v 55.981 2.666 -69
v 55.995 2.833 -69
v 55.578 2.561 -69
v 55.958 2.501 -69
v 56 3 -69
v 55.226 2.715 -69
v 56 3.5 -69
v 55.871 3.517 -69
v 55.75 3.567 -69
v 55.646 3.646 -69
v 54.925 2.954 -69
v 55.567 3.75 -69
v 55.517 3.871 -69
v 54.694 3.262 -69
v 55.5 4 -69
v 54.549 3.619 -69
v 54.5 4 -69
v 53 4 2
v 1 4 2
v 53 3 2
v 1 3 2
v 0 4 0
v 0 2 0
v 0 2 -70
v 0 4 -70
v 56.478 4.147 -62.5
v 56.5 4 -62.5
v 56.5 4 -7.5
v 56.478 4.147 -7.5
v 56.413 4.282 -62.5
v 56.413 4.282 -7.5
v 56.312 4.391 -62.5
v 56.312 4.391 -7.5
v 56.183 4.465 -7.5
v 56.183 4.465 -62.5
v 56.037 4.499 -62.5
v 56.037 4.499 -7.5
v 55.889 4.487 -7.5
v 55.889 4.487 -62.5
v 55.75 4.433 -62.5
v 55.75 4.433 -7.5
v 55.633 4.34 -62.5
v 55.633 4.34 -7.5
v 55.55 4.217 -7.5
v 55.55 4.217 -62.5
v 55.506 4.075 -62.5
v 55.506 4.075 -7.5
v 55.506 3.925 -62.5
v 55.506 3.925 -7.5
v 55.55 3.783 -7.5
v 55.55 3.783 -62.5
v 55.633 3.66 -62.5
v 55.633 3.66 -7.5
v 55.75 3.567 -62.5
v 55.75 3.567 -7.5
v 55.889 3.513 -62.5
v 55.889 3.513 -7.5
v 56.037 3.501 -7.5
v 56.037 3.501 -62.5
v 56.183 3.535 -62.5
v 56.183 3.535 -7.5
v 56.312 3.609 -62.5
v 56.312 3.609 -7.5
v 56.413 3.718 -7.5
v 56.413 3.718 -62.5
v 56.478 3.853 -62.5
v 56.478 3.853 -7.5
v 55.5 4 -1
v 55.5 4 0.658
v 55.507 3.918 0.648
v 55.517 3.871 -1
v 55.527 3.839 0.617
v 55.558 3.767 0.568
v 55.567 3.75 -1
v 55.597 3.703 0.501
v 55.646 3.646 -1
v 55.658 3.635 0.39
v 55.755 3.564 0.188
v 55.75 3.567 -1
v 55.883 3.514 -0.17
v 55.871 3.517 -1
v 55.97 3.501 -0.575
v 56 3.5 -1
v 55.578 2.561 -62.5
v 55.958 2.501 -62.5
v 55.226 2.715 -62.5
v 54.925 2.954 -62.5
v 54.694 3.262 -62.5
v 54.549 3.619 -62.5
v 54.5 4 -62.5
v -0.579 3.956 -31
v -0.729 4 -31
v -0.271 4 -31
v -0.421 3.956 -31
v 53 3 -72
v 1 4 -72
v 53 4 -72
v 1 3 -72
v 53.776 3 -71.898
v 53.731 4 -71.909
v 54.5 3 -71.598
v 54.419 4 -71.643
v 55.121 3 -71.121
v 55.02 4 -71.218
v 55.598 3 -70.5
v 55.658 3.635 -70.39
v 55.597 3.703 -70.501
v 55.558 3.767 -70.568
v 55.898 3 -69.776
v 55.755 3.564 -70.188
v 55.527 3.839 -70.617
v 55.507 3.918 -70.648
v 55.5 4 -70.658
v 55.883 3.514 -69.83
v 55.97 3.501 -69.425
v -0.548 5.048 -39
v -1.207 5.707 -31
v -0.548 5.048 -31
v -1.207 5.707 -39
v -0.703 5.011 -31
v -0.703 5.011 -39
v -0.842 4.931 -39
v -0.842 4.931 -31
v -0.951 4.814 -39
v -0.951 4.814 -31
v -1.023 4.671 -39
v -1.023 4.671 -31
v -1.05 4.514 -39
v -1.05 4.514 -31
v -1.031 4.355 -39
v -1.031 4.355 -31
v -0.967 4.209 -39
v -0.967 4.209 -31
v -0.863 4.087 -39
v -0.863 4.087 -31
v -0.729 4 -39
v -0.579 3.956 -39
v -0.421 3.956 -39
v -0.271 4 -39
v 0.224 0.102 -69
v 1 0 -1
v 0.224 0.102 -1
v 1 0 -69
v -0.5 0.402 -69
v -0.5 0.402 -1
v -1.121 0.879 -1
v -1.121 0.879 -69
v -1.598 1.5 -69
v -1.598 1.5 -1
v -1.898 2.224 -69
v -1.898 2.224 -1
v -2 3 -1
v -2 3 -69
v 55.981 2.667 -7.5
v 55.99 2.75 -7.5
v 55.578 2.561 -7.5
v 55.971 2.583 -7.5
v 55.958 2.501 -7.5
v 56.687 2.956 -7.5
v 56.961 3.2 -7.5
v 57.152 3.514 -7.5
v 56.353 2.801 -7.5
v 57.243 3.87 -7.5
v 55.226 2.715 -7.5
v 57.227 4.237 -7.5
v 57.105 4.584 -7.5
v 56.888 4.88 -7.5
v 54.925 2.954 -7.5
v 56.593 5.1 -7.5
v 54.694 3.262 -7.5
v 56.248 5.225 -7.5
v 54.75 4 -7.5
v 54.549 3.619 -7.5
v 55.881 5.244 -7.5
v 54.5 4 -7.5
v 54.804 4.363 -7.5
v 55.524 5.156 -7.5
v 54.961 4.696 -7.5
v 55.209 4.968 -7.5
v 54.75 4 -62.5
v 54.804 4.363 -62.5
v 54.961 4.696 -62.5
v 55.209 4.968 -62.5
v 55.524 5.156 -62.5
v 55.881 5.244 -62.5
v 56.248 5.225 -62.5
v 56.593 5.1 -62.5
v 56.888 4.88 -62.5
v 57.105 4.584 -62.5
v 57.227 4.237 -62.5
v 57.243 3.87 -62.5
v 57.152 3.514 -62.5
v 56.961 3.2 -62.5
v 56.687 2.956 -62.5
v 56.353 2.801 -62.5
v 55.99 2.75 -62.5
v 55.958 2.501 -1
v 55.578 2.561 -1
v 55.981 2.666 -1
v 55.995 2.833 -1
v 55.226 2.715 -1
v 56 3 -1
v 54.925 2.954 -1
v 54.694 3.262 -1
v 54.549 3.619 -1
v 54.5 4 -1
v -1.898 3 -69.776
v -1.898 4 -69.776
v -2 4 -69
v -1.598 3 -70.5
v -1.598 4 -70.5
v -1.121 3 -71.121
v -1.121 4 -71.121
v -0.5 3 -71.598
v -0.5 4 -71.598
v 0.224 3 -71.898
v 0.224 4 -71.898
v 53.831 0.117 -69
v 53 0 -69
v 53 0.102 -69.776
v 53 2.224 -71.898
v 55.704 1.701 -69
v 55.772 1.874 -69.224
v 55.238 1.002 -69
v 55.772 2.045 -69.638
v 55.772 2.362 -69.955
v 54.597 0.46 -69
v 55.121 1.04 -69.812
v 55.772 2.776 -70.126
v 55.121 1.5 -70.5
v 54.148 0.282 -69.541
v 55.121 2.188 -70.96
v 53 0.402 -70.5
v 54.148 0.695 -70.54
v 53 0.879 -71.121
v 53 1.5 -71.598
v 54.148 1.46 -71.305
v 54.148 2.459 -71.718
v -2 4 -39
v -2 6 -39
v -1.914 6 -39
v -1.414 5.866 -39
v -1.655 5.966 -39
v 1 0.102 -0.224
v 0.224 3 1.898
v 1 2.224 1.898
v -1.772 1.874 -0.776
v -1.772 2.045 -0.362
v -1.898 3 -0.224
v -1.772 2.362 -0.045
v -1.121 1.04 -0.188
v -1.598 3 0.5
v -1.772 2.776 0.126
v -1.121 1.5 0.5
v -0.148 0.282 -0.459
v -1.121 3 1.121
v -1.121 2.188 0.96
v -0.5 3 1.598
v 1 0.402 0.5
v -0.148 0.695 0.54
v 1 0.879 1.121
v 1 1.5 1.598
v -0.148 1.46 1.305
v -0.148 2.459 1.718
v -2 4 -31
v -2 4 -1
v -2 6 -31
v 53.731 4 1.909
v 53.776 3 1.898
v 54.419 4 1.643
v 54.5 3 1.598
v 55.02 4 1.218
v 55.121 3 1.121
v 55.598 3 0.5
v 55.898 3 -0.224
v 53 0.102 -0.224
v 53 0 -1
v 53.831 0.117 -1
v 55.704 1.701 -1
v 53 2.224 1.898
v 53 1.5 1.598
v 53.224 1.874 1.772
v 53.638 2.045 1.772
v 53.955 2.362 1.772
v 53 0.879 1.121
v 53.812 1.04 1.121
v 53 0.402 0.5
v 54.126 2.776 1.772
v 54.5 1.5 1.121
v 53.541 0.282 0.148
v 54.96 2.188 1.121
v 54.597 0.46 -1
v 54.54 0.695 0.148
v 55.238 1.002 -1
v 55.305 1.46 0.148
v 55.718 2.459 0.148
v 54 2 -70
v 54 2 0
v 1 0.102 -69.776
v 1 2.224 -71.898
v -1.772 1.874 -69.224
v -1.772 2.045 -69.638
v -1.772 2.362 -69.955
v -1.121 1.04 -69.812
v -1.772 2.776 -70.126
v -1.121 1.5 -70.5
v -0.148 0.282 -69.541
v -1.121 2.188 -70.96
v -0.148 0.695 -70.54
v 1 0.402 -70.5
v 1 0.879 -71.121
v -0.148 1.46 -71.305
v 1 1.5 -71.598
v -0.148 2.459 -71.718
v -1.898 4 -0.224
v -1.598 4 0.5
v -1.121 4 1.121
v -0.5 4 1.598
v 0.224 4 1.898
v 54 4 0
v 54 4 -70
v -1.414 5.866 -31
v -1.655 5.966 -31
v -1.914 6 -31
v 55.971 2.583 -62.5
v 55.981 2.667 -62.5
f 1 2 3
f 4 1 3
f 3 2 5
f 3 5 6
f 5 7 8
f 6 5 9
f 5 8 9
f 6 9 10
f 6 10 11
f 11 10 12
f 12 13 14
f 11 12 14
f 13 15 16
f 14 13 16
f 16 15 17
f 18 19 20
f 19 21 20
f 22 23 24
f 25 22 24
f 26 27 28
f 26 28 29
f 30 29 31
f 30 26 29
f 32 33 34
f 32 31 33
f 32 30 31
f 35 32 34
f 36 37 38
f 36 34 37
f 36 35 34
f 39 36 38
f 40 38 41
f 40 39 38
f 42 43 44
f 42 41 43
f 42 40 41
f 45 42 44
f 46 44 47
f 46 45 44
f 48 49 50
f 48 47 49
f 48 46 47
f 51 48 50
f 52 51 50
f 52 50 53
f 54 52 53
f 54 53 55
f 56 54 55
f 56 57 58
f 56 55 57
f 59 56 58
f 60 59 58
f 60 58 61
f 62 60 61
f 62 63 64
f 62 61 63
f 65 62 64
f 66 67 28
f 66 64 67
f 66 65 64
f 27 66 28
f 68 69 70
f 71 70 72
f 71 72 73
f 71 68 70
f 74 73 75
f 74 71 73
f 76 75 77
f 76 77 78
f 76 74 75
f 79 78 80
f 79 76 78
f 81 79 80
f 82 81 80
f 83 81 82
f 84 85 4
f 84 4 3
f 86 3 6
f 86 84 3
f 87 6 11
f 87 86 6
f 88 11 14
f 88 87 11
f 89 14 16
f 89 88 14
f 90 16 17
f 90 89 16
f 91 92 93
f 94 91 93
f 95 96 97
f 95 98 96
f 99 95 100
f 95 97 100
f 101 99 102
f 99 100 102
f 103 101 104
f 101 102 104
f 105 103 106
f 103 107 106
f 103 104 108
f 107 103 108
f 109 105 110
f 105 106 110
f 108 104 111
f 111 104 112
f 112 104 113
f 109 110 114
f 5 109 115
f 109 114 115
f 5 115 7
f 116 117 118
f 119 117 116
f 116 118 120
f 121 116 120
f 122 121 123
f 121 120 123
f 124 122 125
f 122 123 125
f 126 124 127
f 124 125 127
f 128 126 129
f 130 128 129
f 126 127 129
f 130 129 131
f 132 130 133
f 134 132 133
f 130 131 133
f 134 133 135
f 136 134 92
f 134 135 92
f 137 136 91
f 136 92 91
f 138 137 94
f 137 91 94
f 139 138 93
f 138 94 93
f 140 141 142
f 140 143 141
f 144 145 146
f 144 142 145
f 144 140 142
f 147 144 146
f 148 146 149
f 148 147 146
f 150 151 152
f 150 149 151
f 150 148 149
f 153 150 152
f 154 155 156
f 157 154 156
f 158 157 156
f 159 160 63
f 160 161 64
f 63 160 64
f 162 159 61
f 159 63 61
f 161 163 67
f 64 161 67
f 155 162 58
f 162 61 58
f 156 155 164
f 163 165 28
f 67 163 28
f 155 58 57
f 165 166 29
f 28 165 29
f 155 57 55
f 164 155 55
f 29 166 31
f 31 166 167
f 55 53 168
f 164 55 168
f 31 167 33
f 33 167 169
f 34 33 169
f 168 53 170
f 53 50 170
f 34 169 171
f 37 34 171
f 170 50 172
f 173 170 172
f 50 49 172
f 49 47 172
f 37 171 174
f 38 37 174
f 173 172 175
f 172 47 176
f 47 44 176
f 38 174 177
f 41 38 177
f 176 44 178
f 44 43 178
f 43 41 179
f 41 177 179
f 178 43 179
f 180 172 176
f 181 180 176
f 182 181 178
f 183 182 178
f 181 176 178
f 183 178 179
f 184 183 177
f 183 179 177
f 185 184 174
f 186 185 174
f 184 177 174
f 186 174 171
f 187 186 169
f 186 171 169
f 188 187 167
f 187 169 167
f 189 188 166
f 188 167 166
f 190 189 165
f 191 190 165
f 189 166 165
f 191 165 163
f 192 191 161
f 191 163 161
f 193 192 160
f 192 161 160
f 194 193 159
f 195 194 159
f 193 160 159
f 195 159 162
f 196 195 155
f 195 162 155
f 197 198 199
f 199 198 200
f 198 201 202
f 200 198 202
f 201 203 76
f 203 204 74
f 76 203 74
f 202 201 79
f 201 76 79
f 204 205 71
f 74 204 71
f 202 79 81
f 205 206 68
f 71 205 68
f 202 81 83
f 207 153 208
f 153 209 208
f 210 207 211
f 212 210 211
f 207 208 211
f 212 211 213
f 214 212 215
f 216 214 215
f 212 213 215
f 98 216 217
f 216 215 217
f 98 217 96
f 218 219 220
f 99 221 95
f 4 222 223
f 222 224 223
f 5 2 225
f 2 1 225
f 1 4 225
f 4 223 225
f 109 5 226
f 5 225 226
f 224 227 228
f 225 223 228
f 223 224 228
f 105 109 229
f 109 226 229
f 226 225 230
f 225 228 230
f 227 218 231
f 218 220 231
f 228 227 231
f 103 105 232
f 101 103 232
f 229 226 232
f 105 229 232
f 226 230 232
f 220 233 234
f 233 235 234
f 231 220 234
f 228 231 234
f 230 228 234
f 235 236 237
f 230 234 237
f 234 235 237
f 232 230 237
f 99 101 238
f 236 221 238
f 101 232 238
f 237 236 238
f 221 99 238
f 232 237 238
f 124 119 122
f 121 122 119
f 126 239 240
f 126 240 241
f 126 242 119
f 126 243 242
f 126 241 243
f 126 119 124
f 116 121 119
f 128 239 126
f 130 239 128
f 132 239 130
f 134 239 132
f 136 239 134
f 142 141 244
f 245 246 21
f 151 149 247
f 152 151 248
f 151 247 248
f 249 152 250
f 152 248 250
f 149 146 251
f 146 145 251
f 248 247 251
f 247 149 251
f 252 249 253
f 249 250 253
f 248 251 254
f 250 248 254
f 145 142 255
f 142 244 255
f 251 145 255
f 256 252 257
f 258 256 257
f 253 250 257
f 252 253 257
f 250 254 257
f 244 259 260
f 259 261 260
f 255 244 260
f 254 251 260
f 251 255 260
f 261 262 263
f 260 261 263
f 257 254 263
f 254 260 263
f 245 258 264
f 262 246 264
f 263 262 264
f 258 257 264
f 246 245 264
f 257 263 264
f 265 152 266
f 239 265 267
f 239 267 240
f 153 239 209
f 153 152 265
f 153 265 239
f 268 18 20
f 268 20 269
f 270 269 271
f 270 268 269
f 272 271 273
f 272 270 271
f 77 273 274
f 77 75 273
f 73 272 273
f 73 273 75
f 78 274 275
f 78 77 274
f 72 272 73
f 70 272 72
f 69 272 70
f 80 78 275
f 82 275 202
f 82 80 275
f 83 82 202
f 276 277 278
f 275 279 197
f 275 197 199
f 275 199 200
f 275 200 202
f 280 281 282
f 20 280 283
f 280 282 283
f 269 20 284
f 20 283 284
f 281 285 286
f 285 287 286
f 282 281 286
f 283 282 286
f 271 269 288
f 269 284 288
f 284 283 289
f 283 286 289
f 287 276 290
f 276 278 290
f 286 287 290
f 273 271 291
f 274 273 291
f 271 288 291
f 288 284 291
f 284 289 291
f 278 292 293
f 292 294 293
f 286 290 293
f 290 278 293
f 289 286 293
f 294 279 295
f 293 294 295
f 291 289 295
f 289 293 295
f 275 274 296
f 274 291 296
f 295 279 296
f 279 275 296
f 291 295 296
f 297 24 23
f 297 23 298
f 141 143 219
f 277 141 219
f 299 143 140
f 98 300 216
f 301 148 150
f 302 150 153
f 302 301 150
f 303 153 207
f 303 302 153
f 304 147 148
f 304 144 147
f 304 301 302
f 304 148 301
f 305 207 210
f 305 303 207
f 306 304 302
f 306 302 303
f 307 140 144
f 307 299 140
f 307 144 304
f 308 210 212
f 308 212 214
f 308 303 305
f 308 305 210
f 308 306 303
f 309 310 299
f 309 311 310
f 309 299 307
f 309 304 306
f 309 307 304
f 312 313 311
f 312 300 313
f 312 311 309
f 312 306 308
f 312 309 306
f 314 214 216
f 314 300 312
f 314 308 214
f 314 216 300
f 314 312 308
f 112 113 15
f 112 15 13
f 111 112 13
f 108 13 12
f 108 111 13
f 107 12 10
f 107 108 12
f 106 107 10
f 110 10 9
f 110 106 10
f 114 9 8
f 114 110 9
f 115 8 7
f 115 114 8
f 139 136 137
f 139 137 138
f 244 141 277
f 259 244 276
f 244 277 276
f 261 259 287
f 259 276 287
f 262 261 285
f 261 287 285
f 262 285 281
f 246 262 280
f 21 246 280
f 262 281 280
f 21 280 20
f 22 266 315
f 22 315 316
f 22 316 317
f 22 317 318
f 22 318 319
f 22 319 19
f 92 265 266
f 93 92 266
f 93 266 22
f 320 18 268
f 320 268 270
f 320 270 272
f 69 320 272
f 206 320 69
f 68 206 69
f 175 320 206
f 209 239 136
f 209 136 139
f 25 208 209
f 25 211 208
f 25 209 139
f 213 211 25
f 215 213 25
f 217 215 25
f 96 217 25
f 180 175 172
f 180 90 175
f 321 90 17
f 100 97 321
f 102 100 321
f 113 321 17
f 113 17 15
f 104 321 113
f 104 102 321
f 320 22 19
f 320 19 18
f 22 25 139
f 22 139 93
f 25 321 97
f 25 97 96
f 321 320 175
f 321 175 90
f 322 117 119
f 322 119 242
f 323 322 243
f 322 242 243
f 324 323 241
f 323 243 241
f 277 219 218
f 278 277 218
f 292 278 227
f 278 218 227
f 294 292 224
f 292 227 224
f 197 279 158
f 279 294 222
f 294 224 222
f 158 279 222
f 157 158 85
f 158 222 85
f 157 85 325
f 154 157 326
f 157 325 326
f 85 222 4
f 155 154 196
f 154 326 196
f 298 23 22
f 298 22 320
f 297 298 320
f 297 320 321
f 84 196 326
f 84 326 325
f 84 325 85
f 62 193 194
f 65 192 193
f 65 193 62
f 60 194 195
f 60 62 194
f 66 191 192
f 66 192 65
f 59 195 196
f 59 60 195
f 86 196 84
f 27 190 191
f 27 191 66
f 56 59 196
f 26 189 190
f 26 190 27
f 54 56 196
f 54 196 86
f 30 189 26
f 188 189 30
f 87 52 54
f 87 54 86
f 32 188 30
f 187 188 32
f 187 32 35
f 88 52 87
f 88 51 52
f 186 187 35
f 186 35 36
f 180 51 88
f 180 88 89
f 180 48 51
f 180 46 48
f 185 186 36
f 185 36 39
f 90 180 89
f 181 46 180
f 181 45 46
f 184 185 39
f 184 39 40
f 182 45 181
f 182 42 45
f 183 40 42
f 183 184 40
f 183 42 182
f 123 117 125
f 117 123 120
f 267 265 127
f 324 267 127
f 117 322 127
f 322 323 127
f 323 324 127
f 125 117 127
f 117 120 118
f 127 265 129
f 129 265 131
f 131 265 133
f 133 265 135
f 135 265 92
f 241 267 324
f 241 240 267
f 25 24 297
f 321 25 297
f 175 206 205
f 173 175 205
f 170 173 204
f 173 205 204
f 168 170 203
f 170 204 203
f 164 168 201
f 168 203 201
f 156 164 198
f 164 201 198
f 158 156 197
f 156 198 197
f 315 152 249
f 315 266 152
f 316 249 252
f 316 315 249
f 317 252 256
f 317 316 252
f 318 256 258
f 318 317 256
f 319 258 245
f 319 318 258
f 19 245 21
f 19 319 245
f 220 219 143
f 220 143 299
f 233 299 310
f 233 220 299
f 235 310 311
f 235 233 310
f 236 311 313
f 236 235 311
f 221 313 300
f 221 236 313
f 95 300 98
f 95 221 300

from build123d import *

# Parameters (mm, degrees)
BOTTOM_W                = 58
BOTTOM_H                = 74
BOTTOM_W_2              = 54
BOTTOM_H_2              = 70
DUVAR_DEPTH             = 4
BOTTOM_2_W              = 54
BOTTOM_2_H              = 70
TABAN_DEPTH             = 2
FILLET2_R               = 3
CENTIK_W                = 1.5
CENTIK_H                = 8
CENTIK_CIKINTI_DEPTH    = 2
SKETCH1_R               = 1.5
CUT_EXTRUDE1_DEPTH      = 6.5
CUT_EXTRUDE2_START      = -6.5
MENTESE_OUT_R           = 1.5
CUT_EXTRUDE2_DEPTH      = 6.5
BOSS_EXTRUDE3_START     = -55
SKETCH2_R               = 1.25
BOSS_EXTRUDE3_DEPTH     = 55
CUT_EXTRUDE3_DEPTH      = 92.403295892
CUT_EXTRUDE3_DEPTH_BACK = 92.403295892
MENTESE_IN_R            = 0.5
CHAMFER1_SIZE           = 1
FILLET3_R               = 1
TIRNAK_R                = 0.55
TIRNAK_EX_DEPTH         = 8


with BuildPart() as part:
    # bottom → duvar (new body)
    with BuildSketch(Plane(origin=(0, 0, 0), x_dir=(1, 0, 0), z_dir=(0, 1, 0))):
        with Locations((27, 35)):
            Rectangle(BOTTOM_W, BOTTOM_H)
        with Locations((27, 35)):
            Rectangle(BOTTOM_W_2, BOTTOM_H_2, mode=Mode.SUBTRACT)
    extrude(amount=DUVAR_DEPTH)

    # bottom<2> → taban (add)
    with BuildSketch(Plane(origin=(0, 0, 0), x_dir=(1, 0, 0), z_dir=(0, 1, 0))):
        with Locations((27, 35)):
            Rectangle(BOTTOM_2_W, BOTTOM_2_H)
    extrude(amount=TABAN_DEPTH)

    # Fillet2
    fillet2_edges = [part.edges().sort_by_distance(p)[0] for p in [
        (27, 0, -72),
        (56, 0, -35),
        (27, 0, 2),
        (-2, 0, -35),
        (-2, 2, -72),
        (56, 2, -72),
        (56, 2, 2),
        (-2, 2, 2),
    ]]
    fillet(fillet2_edges, radius=FILLET2_R)

    # centik → centik cikinti (add)
    with BuildSketch(Plane(origin=(0, 4, 0), x_dir=(1, 0, 0), z_dir=(0, 1, 0))):
        with Locations((-1.25, 35)):
            Rectangle(CENTIK_W, CENTIK_H)
    extrude(amount=CENTIK_CIKINTI_DEPTH)

    # Sketch1 → Cut-Extrude1 (cut)
    with BuildSketch(Plane.XY.offset(-1)):
        with Locations((56, 4)):
            Circle(SKETCH1_R)
    extrude(amount=-CUT_EXTRUDE1_DEPTH, mode=Mode.SUBTRACT)

    # mentese out → Cut-Extrude2 (cut)
    with BuildSketch(Plane(origin=(0, 0, -69), x_dir=(-1, 0, 0), z_dir=(0, 0, -1)).offset(CUT_EXTRUDE2_START)):
        with Locations((-56, 4)):
            Circle(MENTESE_OUT_R)
    extrude(amount=CUT_EXTRUDE2_DEPTH, mode=Mode.SUBTRACT)

    # Sketch2 → Boss-Extrude3 (add)
    with BuildSketch(Plane(origin=(0, 0, -62.5), x_dir=(-1, 0, 0), z_dir=(0, 0, -1)).offset(BOSS_EXTRUDE3_START)):
        with Locations((-56, 4)):
            Circle(SKETCH2_R)
    extrude(amount=BOSS_EXTRUDE3_DEPTH)

    # mentese in → Cut-Extrude3 (cut, two sides: drawn at the far end of the back side and taken through both)
    with BuildSketch(Plane.XY.offset(-1).offset(-CUT_EXTRUDE3_DEPTH_BACK)):
        with Locations((56, 4)):
            Circle(MENTESE_IN_R)
    extrude(amount=CUT_EXTRUDE3_DEPTH + CUT_EXTRUDE3_DEPTH_BACK, mode=Mode.SUBTRACT)

    # Chamfer1
    chamfer1_edges = [part.edges().sort_by_distance(p)[0] for p in [
        (-0.5, 6, -35),
    ]]
    chamfer(chamfer1_edges, length=CHAMFER1_SIZE)

    # Fillet3
    fillet3_edges = [part.edges().sort_by_distance(p)[0] for p in [
        (-1.5, 6, -35),
    ]]
    fillet(fillet3_edges, radius=FILLET3_R)

    # tirnak → tirnak ex (cut)
    with BuildSketch(Plane.XY.offset(-31)):
        with Locations((-0.5, 4.5)):
            Circle(TIRNAK_R)
    extrude(amount=-TIRNAK_EX_DEPTH, mode=Mode.SUBTRACT)


solid = part.part
